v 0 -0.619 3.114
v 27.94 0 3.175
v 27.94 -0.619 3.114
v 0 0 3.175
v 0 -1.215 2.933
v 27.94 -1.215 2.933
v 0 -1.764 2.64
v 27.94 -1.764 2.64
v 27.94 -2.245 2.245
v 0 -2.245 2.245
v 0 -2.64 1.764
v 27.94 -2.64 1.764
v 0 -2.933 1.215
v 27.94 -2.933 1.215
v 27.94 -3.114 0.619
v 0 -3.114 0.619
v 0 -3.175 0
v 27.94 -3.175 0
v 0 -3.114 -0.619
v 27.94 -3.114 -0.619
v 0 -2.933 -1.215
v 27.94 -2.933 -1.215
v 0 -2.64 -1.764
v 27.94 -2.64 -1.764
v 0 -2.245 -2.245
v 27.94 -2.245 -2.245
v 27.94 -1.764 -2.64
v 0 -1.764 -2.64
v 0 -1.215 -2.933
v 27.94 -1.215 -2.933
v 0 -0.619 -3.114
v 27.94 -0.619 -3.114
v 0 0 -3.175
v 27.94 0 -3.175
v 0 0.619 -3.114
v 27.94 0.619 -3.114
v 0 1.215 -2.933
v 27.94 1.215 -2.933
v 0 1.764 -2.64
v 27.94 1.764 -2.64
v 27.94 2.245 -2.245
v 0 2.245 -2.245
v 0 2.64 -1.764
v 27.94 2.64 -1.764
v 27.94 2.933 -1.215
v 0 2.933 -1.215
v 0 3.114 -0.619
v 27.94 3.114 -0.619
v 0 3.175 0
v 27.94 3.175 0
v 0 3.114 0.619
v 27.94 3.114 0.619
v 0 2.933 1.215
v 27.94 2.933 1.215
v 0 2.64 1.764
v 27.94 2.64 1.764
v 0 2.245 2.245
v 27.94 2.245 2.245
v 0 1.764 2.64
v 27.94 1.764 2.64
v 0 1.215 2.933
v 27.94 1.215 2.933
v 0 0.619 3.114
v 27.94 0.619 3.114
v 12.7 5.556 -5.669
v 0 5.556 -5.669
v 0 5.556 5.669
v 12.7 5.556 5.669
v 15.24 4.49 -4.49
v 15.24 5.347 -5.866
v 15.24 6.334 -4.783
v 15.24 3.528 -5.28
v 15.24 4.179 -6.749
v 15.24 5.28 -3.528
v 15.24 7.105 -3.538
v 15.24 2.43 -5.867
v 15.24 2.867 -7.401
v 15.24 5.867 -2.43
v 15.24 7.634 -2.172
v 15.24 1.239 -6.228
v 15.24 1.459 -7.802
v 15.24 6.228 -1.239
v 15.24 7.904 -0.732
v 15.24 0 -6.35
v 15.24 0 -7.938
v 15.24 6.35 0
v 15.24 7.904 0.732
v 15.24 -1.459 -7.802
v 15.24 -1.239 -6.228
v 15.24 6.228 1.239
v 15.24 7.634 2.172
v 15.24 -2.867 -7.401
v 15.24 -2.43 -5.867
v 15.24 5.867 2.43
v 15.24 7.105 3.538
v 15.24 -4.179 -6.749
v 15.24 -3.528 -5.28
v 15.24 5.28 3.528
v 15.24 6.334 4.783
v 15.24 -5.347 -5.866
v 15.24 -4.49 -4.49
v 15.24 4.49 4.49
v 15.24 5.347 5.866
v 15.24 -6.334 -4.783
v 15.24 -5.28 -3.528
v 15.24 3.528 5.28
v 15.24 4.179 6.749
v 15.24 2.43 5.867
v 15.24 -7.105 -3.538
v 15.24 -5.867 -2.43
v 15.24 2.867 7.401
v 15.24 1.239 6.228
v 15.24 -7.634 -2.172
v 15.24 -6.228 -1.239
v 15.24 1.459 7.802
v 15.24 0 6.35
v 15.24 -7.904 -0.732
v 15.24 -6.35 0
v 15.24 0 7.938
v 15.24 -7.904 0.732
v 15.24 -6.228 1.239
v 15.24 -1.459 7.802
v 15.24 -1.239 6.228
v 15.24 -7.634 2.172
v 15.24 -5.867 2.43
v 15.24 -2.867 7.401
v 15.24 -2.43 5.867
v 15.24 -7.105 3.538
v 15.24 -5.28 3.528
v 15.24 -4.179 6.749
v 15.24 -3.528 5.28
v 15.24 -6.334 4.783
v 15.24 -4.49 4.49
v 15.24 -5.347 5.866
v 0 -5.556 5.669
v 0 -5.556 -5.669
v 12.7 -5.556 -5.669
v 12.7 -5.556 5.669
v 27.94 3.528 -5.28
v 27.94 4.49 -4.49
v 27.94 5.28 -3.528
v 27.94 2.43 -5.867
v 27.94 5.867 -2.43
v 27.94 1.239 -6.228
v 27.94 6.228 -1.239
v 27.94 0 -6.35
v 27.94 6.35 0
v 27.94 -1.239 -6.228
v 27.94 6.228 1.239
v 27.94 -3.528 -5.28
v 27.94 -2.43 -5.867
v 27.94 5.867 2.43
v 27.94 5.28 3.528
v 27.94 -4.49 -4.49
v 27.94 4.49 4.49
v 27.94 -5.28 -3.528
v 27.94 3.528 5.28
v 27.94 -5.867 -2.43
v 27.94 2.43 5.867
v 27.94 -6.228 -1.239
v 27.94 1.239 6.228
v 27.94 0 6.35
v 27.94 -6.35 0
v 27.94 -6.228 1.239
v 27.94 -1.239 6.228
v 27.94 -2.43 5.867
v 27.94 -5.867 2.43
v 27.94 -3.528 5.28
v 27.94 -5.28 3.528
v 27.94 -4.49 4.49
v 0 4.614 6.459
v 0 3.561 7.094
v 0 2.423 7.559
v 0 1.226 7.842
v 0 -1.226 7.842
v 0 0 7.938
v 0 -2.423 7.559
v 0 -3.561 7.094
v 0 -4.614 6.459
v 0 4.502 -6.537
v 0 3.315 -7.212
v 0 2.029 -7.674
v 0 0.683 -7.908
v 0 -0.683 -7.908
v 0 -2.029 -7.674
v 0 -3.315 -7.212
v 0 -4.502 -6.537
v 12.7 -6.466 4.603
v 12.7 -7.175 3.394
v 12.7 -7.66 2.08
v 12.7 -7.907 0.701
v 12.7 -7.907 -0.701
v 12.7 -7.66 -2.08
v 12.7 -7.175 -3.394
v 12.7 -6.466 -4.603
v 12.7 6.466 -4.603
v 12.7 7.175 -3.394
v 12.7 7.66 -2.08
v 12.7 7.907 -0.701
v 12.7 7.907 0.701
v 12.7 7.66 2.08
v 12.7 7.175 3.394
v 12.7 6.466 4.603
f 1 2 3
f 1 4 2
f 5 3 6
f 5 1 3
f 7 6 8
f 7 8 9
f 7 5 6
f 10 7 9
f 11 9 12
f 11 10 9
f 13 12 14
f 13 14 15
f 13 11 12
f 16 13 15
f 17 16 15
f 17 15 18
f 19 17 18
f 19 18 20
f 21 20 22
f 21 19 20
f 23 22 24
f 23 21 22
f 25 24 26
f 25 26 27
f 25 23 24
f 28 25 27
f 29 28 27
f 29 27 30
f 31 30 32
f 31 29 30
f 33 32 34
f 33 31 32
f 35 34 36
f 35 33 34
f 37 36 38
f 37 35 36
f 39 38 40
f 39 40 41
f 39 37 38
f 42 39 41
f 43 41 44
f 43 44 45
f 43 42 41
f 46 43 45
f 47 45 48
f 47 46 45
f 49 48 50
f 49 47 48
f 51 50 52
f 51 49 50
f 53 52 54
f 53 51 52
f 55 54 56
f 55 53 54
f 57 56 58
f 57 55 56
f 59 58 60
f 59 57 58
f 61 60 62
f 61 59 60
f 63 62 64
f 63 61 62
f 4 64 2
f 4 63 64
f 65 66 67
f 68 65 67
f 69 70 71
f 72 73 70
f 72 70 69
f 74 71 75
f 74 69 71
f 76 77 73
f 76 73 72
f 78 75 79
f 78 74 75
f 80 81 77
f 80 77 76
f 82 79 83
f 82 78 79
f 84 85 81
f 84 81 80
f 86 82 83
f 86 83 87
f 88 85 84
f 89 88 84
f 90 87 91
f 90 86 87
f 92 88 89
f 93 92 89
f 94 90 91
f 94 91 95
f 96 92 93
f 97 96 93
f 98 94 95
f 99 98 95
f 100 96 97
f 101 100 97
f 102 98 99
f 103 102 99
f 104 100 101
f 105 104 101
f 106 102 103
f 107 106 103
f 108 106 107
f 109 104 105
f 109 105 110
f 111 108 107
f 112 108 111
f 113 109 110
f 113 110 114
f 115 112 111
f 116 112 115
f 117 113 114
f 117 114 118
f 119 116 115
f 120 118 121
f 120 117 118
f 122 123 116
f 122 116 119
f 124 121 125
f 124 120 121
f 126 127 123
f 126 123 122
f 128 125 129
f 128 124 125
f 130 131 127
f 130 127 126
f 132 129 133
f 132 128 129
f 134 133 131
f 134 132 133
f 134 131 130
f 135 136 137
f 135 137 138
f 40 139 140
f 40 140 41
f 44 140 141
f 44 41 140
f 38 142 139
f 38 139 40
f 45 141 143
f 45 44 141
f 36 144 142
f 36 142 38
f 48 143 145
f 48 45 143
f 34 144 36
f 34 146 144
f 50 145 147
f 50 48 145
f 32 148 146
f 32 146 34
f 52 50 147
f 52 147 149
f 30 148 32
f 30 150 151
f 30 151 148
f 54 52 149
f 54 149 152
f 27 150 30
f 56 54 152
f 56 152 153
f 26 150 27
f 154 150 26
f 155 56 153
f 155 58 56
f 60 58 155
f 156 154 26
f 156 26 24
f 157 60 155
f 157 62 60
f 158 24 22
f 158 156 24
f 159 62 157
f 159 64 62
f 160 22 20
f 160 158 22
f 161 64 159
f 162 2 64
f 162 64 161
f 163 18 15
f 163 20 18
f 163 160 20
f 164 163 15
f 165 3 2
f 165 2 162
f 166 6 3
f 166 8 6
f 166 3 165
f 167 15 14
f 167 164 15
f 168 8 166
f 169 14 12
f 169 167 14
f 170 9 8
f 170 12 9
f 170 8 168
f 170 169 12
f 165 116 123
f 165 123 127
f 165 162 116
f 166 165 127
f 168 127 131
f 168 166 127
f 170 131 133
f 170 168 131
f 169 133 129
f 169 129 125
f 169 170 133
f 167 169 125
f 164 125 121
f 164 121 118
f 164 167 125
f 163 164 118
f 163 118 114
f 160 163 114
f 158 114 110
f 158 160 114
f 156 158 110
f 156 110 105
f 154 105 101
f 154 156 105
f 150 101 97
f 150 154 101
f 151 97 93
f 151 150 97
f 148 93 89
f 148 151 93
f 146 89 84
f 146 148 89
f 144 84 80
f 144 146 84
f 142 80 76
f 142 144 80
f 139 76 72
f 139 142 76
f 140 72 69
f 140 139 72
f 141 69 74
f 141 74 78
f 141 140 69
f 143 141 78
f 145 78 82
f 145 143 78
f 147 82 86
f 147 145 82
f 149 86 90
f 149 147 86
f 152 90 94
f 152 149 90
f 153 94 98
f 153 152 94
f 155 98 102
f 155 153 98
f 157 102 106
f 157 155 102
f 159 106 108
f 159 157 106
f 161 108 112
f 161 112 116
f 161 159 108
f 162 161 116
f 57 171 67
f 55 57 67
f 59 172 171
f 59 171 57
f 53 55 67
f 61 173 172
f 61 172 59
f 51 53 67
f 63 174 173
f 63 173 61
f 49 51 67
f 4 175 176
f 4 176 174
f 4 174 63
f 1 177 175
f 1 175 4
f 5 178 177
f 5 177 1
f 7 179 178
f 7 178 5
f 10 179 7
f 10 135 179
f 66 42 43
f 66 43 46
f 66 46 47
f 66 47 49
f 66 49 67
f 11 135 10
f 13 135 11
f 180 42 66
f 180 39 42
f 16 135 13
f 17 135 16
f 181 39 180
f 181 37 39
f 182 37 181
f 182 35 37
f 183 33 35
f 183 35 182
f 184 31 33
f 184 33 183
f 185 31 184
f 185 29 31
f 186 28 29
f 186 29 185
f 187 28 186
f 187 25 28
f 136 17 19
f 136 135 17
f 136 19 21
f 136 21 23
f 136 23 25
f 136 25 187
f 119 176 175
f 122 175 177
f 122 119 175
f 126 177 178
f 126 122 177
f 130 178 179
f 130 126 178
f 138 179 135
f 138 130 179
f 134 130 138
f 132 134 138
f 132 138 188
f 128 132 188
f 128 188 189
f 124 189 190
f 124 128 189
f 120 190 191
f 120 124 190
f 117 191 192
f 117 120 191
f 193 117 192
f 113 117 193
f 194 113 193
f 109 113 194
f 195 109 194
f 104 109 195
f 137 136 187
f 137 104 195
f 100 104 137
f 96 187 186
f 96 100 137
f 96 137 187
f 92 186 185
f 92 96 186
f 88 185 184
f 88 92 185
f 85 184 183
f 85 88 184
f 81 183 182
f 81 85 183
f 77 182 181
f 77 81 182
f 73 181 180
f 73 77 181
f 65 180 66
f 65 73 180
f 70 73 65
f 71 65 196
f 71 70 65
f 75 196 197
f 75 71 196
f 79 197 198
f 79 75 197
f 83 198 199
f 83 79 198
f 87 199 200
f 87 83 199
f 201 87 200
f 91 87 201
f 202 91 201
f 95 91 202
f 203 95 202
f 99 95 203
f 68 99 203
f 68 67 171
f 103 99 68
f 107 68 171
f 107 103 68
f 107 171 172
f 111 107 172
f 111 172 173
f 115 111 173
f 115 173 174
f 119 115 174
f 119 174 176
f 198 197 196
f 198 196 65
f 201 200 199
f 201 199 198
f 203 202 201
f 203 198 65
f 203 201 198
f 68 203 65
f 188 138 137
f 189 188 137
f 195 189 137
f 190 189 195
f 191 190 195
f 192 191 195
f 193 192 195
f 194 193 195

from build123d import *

# Parameters (mm, degrees)
CUT_EXTRUDE2_START = -12.7
CUT_EXTRUDE2_DEPTH = 12.7


with BuildPart() as part:
    # Sketch1 → Revolve1 (revolve)
    with BuildSketch(Plane.XY, mode=Mode.PRIVATE) as revolve1_sk:
        Polygon((0, 3.175), (0, 7.9375), (15.24, 7.9375), (15.24, 6.35), (27.94, 6.35), (27.94, 3.175), align=None)
    revolve(revolve1_sk.sketch.rotate(Axis((0, 0, 0), (1, 0, 0)), 90), axis=Axis((0, 0, 0), (1, 0, 0)))

    # Sketch2 → Cut-Extrude2 (cut)
    with BuildSketch(Plane.ZY.offset(CUT_EXTRUDE2_START)):
        with BuildLine():
            Line((-5.668508815, 5.55625), (5.668508815, 5.55625))
            ThreePointArc((5.668508815, 5.55625), (0, 7.9375), (-5.668508815, 5.55625))
        make_face()
        with BuildLine():
            Line((-5.668508815, -5.55625), (5.668508815, -5.55625))
            ThreePointArc((5.668508815, -5.55625), (0, -7.9375), (-5.668508815, -5.55625))
        make_face()
    extrude(amount=CUT_EXTRUDE2_DEPTH, mode=Mode.SUBTRACT)


solid = part.part
